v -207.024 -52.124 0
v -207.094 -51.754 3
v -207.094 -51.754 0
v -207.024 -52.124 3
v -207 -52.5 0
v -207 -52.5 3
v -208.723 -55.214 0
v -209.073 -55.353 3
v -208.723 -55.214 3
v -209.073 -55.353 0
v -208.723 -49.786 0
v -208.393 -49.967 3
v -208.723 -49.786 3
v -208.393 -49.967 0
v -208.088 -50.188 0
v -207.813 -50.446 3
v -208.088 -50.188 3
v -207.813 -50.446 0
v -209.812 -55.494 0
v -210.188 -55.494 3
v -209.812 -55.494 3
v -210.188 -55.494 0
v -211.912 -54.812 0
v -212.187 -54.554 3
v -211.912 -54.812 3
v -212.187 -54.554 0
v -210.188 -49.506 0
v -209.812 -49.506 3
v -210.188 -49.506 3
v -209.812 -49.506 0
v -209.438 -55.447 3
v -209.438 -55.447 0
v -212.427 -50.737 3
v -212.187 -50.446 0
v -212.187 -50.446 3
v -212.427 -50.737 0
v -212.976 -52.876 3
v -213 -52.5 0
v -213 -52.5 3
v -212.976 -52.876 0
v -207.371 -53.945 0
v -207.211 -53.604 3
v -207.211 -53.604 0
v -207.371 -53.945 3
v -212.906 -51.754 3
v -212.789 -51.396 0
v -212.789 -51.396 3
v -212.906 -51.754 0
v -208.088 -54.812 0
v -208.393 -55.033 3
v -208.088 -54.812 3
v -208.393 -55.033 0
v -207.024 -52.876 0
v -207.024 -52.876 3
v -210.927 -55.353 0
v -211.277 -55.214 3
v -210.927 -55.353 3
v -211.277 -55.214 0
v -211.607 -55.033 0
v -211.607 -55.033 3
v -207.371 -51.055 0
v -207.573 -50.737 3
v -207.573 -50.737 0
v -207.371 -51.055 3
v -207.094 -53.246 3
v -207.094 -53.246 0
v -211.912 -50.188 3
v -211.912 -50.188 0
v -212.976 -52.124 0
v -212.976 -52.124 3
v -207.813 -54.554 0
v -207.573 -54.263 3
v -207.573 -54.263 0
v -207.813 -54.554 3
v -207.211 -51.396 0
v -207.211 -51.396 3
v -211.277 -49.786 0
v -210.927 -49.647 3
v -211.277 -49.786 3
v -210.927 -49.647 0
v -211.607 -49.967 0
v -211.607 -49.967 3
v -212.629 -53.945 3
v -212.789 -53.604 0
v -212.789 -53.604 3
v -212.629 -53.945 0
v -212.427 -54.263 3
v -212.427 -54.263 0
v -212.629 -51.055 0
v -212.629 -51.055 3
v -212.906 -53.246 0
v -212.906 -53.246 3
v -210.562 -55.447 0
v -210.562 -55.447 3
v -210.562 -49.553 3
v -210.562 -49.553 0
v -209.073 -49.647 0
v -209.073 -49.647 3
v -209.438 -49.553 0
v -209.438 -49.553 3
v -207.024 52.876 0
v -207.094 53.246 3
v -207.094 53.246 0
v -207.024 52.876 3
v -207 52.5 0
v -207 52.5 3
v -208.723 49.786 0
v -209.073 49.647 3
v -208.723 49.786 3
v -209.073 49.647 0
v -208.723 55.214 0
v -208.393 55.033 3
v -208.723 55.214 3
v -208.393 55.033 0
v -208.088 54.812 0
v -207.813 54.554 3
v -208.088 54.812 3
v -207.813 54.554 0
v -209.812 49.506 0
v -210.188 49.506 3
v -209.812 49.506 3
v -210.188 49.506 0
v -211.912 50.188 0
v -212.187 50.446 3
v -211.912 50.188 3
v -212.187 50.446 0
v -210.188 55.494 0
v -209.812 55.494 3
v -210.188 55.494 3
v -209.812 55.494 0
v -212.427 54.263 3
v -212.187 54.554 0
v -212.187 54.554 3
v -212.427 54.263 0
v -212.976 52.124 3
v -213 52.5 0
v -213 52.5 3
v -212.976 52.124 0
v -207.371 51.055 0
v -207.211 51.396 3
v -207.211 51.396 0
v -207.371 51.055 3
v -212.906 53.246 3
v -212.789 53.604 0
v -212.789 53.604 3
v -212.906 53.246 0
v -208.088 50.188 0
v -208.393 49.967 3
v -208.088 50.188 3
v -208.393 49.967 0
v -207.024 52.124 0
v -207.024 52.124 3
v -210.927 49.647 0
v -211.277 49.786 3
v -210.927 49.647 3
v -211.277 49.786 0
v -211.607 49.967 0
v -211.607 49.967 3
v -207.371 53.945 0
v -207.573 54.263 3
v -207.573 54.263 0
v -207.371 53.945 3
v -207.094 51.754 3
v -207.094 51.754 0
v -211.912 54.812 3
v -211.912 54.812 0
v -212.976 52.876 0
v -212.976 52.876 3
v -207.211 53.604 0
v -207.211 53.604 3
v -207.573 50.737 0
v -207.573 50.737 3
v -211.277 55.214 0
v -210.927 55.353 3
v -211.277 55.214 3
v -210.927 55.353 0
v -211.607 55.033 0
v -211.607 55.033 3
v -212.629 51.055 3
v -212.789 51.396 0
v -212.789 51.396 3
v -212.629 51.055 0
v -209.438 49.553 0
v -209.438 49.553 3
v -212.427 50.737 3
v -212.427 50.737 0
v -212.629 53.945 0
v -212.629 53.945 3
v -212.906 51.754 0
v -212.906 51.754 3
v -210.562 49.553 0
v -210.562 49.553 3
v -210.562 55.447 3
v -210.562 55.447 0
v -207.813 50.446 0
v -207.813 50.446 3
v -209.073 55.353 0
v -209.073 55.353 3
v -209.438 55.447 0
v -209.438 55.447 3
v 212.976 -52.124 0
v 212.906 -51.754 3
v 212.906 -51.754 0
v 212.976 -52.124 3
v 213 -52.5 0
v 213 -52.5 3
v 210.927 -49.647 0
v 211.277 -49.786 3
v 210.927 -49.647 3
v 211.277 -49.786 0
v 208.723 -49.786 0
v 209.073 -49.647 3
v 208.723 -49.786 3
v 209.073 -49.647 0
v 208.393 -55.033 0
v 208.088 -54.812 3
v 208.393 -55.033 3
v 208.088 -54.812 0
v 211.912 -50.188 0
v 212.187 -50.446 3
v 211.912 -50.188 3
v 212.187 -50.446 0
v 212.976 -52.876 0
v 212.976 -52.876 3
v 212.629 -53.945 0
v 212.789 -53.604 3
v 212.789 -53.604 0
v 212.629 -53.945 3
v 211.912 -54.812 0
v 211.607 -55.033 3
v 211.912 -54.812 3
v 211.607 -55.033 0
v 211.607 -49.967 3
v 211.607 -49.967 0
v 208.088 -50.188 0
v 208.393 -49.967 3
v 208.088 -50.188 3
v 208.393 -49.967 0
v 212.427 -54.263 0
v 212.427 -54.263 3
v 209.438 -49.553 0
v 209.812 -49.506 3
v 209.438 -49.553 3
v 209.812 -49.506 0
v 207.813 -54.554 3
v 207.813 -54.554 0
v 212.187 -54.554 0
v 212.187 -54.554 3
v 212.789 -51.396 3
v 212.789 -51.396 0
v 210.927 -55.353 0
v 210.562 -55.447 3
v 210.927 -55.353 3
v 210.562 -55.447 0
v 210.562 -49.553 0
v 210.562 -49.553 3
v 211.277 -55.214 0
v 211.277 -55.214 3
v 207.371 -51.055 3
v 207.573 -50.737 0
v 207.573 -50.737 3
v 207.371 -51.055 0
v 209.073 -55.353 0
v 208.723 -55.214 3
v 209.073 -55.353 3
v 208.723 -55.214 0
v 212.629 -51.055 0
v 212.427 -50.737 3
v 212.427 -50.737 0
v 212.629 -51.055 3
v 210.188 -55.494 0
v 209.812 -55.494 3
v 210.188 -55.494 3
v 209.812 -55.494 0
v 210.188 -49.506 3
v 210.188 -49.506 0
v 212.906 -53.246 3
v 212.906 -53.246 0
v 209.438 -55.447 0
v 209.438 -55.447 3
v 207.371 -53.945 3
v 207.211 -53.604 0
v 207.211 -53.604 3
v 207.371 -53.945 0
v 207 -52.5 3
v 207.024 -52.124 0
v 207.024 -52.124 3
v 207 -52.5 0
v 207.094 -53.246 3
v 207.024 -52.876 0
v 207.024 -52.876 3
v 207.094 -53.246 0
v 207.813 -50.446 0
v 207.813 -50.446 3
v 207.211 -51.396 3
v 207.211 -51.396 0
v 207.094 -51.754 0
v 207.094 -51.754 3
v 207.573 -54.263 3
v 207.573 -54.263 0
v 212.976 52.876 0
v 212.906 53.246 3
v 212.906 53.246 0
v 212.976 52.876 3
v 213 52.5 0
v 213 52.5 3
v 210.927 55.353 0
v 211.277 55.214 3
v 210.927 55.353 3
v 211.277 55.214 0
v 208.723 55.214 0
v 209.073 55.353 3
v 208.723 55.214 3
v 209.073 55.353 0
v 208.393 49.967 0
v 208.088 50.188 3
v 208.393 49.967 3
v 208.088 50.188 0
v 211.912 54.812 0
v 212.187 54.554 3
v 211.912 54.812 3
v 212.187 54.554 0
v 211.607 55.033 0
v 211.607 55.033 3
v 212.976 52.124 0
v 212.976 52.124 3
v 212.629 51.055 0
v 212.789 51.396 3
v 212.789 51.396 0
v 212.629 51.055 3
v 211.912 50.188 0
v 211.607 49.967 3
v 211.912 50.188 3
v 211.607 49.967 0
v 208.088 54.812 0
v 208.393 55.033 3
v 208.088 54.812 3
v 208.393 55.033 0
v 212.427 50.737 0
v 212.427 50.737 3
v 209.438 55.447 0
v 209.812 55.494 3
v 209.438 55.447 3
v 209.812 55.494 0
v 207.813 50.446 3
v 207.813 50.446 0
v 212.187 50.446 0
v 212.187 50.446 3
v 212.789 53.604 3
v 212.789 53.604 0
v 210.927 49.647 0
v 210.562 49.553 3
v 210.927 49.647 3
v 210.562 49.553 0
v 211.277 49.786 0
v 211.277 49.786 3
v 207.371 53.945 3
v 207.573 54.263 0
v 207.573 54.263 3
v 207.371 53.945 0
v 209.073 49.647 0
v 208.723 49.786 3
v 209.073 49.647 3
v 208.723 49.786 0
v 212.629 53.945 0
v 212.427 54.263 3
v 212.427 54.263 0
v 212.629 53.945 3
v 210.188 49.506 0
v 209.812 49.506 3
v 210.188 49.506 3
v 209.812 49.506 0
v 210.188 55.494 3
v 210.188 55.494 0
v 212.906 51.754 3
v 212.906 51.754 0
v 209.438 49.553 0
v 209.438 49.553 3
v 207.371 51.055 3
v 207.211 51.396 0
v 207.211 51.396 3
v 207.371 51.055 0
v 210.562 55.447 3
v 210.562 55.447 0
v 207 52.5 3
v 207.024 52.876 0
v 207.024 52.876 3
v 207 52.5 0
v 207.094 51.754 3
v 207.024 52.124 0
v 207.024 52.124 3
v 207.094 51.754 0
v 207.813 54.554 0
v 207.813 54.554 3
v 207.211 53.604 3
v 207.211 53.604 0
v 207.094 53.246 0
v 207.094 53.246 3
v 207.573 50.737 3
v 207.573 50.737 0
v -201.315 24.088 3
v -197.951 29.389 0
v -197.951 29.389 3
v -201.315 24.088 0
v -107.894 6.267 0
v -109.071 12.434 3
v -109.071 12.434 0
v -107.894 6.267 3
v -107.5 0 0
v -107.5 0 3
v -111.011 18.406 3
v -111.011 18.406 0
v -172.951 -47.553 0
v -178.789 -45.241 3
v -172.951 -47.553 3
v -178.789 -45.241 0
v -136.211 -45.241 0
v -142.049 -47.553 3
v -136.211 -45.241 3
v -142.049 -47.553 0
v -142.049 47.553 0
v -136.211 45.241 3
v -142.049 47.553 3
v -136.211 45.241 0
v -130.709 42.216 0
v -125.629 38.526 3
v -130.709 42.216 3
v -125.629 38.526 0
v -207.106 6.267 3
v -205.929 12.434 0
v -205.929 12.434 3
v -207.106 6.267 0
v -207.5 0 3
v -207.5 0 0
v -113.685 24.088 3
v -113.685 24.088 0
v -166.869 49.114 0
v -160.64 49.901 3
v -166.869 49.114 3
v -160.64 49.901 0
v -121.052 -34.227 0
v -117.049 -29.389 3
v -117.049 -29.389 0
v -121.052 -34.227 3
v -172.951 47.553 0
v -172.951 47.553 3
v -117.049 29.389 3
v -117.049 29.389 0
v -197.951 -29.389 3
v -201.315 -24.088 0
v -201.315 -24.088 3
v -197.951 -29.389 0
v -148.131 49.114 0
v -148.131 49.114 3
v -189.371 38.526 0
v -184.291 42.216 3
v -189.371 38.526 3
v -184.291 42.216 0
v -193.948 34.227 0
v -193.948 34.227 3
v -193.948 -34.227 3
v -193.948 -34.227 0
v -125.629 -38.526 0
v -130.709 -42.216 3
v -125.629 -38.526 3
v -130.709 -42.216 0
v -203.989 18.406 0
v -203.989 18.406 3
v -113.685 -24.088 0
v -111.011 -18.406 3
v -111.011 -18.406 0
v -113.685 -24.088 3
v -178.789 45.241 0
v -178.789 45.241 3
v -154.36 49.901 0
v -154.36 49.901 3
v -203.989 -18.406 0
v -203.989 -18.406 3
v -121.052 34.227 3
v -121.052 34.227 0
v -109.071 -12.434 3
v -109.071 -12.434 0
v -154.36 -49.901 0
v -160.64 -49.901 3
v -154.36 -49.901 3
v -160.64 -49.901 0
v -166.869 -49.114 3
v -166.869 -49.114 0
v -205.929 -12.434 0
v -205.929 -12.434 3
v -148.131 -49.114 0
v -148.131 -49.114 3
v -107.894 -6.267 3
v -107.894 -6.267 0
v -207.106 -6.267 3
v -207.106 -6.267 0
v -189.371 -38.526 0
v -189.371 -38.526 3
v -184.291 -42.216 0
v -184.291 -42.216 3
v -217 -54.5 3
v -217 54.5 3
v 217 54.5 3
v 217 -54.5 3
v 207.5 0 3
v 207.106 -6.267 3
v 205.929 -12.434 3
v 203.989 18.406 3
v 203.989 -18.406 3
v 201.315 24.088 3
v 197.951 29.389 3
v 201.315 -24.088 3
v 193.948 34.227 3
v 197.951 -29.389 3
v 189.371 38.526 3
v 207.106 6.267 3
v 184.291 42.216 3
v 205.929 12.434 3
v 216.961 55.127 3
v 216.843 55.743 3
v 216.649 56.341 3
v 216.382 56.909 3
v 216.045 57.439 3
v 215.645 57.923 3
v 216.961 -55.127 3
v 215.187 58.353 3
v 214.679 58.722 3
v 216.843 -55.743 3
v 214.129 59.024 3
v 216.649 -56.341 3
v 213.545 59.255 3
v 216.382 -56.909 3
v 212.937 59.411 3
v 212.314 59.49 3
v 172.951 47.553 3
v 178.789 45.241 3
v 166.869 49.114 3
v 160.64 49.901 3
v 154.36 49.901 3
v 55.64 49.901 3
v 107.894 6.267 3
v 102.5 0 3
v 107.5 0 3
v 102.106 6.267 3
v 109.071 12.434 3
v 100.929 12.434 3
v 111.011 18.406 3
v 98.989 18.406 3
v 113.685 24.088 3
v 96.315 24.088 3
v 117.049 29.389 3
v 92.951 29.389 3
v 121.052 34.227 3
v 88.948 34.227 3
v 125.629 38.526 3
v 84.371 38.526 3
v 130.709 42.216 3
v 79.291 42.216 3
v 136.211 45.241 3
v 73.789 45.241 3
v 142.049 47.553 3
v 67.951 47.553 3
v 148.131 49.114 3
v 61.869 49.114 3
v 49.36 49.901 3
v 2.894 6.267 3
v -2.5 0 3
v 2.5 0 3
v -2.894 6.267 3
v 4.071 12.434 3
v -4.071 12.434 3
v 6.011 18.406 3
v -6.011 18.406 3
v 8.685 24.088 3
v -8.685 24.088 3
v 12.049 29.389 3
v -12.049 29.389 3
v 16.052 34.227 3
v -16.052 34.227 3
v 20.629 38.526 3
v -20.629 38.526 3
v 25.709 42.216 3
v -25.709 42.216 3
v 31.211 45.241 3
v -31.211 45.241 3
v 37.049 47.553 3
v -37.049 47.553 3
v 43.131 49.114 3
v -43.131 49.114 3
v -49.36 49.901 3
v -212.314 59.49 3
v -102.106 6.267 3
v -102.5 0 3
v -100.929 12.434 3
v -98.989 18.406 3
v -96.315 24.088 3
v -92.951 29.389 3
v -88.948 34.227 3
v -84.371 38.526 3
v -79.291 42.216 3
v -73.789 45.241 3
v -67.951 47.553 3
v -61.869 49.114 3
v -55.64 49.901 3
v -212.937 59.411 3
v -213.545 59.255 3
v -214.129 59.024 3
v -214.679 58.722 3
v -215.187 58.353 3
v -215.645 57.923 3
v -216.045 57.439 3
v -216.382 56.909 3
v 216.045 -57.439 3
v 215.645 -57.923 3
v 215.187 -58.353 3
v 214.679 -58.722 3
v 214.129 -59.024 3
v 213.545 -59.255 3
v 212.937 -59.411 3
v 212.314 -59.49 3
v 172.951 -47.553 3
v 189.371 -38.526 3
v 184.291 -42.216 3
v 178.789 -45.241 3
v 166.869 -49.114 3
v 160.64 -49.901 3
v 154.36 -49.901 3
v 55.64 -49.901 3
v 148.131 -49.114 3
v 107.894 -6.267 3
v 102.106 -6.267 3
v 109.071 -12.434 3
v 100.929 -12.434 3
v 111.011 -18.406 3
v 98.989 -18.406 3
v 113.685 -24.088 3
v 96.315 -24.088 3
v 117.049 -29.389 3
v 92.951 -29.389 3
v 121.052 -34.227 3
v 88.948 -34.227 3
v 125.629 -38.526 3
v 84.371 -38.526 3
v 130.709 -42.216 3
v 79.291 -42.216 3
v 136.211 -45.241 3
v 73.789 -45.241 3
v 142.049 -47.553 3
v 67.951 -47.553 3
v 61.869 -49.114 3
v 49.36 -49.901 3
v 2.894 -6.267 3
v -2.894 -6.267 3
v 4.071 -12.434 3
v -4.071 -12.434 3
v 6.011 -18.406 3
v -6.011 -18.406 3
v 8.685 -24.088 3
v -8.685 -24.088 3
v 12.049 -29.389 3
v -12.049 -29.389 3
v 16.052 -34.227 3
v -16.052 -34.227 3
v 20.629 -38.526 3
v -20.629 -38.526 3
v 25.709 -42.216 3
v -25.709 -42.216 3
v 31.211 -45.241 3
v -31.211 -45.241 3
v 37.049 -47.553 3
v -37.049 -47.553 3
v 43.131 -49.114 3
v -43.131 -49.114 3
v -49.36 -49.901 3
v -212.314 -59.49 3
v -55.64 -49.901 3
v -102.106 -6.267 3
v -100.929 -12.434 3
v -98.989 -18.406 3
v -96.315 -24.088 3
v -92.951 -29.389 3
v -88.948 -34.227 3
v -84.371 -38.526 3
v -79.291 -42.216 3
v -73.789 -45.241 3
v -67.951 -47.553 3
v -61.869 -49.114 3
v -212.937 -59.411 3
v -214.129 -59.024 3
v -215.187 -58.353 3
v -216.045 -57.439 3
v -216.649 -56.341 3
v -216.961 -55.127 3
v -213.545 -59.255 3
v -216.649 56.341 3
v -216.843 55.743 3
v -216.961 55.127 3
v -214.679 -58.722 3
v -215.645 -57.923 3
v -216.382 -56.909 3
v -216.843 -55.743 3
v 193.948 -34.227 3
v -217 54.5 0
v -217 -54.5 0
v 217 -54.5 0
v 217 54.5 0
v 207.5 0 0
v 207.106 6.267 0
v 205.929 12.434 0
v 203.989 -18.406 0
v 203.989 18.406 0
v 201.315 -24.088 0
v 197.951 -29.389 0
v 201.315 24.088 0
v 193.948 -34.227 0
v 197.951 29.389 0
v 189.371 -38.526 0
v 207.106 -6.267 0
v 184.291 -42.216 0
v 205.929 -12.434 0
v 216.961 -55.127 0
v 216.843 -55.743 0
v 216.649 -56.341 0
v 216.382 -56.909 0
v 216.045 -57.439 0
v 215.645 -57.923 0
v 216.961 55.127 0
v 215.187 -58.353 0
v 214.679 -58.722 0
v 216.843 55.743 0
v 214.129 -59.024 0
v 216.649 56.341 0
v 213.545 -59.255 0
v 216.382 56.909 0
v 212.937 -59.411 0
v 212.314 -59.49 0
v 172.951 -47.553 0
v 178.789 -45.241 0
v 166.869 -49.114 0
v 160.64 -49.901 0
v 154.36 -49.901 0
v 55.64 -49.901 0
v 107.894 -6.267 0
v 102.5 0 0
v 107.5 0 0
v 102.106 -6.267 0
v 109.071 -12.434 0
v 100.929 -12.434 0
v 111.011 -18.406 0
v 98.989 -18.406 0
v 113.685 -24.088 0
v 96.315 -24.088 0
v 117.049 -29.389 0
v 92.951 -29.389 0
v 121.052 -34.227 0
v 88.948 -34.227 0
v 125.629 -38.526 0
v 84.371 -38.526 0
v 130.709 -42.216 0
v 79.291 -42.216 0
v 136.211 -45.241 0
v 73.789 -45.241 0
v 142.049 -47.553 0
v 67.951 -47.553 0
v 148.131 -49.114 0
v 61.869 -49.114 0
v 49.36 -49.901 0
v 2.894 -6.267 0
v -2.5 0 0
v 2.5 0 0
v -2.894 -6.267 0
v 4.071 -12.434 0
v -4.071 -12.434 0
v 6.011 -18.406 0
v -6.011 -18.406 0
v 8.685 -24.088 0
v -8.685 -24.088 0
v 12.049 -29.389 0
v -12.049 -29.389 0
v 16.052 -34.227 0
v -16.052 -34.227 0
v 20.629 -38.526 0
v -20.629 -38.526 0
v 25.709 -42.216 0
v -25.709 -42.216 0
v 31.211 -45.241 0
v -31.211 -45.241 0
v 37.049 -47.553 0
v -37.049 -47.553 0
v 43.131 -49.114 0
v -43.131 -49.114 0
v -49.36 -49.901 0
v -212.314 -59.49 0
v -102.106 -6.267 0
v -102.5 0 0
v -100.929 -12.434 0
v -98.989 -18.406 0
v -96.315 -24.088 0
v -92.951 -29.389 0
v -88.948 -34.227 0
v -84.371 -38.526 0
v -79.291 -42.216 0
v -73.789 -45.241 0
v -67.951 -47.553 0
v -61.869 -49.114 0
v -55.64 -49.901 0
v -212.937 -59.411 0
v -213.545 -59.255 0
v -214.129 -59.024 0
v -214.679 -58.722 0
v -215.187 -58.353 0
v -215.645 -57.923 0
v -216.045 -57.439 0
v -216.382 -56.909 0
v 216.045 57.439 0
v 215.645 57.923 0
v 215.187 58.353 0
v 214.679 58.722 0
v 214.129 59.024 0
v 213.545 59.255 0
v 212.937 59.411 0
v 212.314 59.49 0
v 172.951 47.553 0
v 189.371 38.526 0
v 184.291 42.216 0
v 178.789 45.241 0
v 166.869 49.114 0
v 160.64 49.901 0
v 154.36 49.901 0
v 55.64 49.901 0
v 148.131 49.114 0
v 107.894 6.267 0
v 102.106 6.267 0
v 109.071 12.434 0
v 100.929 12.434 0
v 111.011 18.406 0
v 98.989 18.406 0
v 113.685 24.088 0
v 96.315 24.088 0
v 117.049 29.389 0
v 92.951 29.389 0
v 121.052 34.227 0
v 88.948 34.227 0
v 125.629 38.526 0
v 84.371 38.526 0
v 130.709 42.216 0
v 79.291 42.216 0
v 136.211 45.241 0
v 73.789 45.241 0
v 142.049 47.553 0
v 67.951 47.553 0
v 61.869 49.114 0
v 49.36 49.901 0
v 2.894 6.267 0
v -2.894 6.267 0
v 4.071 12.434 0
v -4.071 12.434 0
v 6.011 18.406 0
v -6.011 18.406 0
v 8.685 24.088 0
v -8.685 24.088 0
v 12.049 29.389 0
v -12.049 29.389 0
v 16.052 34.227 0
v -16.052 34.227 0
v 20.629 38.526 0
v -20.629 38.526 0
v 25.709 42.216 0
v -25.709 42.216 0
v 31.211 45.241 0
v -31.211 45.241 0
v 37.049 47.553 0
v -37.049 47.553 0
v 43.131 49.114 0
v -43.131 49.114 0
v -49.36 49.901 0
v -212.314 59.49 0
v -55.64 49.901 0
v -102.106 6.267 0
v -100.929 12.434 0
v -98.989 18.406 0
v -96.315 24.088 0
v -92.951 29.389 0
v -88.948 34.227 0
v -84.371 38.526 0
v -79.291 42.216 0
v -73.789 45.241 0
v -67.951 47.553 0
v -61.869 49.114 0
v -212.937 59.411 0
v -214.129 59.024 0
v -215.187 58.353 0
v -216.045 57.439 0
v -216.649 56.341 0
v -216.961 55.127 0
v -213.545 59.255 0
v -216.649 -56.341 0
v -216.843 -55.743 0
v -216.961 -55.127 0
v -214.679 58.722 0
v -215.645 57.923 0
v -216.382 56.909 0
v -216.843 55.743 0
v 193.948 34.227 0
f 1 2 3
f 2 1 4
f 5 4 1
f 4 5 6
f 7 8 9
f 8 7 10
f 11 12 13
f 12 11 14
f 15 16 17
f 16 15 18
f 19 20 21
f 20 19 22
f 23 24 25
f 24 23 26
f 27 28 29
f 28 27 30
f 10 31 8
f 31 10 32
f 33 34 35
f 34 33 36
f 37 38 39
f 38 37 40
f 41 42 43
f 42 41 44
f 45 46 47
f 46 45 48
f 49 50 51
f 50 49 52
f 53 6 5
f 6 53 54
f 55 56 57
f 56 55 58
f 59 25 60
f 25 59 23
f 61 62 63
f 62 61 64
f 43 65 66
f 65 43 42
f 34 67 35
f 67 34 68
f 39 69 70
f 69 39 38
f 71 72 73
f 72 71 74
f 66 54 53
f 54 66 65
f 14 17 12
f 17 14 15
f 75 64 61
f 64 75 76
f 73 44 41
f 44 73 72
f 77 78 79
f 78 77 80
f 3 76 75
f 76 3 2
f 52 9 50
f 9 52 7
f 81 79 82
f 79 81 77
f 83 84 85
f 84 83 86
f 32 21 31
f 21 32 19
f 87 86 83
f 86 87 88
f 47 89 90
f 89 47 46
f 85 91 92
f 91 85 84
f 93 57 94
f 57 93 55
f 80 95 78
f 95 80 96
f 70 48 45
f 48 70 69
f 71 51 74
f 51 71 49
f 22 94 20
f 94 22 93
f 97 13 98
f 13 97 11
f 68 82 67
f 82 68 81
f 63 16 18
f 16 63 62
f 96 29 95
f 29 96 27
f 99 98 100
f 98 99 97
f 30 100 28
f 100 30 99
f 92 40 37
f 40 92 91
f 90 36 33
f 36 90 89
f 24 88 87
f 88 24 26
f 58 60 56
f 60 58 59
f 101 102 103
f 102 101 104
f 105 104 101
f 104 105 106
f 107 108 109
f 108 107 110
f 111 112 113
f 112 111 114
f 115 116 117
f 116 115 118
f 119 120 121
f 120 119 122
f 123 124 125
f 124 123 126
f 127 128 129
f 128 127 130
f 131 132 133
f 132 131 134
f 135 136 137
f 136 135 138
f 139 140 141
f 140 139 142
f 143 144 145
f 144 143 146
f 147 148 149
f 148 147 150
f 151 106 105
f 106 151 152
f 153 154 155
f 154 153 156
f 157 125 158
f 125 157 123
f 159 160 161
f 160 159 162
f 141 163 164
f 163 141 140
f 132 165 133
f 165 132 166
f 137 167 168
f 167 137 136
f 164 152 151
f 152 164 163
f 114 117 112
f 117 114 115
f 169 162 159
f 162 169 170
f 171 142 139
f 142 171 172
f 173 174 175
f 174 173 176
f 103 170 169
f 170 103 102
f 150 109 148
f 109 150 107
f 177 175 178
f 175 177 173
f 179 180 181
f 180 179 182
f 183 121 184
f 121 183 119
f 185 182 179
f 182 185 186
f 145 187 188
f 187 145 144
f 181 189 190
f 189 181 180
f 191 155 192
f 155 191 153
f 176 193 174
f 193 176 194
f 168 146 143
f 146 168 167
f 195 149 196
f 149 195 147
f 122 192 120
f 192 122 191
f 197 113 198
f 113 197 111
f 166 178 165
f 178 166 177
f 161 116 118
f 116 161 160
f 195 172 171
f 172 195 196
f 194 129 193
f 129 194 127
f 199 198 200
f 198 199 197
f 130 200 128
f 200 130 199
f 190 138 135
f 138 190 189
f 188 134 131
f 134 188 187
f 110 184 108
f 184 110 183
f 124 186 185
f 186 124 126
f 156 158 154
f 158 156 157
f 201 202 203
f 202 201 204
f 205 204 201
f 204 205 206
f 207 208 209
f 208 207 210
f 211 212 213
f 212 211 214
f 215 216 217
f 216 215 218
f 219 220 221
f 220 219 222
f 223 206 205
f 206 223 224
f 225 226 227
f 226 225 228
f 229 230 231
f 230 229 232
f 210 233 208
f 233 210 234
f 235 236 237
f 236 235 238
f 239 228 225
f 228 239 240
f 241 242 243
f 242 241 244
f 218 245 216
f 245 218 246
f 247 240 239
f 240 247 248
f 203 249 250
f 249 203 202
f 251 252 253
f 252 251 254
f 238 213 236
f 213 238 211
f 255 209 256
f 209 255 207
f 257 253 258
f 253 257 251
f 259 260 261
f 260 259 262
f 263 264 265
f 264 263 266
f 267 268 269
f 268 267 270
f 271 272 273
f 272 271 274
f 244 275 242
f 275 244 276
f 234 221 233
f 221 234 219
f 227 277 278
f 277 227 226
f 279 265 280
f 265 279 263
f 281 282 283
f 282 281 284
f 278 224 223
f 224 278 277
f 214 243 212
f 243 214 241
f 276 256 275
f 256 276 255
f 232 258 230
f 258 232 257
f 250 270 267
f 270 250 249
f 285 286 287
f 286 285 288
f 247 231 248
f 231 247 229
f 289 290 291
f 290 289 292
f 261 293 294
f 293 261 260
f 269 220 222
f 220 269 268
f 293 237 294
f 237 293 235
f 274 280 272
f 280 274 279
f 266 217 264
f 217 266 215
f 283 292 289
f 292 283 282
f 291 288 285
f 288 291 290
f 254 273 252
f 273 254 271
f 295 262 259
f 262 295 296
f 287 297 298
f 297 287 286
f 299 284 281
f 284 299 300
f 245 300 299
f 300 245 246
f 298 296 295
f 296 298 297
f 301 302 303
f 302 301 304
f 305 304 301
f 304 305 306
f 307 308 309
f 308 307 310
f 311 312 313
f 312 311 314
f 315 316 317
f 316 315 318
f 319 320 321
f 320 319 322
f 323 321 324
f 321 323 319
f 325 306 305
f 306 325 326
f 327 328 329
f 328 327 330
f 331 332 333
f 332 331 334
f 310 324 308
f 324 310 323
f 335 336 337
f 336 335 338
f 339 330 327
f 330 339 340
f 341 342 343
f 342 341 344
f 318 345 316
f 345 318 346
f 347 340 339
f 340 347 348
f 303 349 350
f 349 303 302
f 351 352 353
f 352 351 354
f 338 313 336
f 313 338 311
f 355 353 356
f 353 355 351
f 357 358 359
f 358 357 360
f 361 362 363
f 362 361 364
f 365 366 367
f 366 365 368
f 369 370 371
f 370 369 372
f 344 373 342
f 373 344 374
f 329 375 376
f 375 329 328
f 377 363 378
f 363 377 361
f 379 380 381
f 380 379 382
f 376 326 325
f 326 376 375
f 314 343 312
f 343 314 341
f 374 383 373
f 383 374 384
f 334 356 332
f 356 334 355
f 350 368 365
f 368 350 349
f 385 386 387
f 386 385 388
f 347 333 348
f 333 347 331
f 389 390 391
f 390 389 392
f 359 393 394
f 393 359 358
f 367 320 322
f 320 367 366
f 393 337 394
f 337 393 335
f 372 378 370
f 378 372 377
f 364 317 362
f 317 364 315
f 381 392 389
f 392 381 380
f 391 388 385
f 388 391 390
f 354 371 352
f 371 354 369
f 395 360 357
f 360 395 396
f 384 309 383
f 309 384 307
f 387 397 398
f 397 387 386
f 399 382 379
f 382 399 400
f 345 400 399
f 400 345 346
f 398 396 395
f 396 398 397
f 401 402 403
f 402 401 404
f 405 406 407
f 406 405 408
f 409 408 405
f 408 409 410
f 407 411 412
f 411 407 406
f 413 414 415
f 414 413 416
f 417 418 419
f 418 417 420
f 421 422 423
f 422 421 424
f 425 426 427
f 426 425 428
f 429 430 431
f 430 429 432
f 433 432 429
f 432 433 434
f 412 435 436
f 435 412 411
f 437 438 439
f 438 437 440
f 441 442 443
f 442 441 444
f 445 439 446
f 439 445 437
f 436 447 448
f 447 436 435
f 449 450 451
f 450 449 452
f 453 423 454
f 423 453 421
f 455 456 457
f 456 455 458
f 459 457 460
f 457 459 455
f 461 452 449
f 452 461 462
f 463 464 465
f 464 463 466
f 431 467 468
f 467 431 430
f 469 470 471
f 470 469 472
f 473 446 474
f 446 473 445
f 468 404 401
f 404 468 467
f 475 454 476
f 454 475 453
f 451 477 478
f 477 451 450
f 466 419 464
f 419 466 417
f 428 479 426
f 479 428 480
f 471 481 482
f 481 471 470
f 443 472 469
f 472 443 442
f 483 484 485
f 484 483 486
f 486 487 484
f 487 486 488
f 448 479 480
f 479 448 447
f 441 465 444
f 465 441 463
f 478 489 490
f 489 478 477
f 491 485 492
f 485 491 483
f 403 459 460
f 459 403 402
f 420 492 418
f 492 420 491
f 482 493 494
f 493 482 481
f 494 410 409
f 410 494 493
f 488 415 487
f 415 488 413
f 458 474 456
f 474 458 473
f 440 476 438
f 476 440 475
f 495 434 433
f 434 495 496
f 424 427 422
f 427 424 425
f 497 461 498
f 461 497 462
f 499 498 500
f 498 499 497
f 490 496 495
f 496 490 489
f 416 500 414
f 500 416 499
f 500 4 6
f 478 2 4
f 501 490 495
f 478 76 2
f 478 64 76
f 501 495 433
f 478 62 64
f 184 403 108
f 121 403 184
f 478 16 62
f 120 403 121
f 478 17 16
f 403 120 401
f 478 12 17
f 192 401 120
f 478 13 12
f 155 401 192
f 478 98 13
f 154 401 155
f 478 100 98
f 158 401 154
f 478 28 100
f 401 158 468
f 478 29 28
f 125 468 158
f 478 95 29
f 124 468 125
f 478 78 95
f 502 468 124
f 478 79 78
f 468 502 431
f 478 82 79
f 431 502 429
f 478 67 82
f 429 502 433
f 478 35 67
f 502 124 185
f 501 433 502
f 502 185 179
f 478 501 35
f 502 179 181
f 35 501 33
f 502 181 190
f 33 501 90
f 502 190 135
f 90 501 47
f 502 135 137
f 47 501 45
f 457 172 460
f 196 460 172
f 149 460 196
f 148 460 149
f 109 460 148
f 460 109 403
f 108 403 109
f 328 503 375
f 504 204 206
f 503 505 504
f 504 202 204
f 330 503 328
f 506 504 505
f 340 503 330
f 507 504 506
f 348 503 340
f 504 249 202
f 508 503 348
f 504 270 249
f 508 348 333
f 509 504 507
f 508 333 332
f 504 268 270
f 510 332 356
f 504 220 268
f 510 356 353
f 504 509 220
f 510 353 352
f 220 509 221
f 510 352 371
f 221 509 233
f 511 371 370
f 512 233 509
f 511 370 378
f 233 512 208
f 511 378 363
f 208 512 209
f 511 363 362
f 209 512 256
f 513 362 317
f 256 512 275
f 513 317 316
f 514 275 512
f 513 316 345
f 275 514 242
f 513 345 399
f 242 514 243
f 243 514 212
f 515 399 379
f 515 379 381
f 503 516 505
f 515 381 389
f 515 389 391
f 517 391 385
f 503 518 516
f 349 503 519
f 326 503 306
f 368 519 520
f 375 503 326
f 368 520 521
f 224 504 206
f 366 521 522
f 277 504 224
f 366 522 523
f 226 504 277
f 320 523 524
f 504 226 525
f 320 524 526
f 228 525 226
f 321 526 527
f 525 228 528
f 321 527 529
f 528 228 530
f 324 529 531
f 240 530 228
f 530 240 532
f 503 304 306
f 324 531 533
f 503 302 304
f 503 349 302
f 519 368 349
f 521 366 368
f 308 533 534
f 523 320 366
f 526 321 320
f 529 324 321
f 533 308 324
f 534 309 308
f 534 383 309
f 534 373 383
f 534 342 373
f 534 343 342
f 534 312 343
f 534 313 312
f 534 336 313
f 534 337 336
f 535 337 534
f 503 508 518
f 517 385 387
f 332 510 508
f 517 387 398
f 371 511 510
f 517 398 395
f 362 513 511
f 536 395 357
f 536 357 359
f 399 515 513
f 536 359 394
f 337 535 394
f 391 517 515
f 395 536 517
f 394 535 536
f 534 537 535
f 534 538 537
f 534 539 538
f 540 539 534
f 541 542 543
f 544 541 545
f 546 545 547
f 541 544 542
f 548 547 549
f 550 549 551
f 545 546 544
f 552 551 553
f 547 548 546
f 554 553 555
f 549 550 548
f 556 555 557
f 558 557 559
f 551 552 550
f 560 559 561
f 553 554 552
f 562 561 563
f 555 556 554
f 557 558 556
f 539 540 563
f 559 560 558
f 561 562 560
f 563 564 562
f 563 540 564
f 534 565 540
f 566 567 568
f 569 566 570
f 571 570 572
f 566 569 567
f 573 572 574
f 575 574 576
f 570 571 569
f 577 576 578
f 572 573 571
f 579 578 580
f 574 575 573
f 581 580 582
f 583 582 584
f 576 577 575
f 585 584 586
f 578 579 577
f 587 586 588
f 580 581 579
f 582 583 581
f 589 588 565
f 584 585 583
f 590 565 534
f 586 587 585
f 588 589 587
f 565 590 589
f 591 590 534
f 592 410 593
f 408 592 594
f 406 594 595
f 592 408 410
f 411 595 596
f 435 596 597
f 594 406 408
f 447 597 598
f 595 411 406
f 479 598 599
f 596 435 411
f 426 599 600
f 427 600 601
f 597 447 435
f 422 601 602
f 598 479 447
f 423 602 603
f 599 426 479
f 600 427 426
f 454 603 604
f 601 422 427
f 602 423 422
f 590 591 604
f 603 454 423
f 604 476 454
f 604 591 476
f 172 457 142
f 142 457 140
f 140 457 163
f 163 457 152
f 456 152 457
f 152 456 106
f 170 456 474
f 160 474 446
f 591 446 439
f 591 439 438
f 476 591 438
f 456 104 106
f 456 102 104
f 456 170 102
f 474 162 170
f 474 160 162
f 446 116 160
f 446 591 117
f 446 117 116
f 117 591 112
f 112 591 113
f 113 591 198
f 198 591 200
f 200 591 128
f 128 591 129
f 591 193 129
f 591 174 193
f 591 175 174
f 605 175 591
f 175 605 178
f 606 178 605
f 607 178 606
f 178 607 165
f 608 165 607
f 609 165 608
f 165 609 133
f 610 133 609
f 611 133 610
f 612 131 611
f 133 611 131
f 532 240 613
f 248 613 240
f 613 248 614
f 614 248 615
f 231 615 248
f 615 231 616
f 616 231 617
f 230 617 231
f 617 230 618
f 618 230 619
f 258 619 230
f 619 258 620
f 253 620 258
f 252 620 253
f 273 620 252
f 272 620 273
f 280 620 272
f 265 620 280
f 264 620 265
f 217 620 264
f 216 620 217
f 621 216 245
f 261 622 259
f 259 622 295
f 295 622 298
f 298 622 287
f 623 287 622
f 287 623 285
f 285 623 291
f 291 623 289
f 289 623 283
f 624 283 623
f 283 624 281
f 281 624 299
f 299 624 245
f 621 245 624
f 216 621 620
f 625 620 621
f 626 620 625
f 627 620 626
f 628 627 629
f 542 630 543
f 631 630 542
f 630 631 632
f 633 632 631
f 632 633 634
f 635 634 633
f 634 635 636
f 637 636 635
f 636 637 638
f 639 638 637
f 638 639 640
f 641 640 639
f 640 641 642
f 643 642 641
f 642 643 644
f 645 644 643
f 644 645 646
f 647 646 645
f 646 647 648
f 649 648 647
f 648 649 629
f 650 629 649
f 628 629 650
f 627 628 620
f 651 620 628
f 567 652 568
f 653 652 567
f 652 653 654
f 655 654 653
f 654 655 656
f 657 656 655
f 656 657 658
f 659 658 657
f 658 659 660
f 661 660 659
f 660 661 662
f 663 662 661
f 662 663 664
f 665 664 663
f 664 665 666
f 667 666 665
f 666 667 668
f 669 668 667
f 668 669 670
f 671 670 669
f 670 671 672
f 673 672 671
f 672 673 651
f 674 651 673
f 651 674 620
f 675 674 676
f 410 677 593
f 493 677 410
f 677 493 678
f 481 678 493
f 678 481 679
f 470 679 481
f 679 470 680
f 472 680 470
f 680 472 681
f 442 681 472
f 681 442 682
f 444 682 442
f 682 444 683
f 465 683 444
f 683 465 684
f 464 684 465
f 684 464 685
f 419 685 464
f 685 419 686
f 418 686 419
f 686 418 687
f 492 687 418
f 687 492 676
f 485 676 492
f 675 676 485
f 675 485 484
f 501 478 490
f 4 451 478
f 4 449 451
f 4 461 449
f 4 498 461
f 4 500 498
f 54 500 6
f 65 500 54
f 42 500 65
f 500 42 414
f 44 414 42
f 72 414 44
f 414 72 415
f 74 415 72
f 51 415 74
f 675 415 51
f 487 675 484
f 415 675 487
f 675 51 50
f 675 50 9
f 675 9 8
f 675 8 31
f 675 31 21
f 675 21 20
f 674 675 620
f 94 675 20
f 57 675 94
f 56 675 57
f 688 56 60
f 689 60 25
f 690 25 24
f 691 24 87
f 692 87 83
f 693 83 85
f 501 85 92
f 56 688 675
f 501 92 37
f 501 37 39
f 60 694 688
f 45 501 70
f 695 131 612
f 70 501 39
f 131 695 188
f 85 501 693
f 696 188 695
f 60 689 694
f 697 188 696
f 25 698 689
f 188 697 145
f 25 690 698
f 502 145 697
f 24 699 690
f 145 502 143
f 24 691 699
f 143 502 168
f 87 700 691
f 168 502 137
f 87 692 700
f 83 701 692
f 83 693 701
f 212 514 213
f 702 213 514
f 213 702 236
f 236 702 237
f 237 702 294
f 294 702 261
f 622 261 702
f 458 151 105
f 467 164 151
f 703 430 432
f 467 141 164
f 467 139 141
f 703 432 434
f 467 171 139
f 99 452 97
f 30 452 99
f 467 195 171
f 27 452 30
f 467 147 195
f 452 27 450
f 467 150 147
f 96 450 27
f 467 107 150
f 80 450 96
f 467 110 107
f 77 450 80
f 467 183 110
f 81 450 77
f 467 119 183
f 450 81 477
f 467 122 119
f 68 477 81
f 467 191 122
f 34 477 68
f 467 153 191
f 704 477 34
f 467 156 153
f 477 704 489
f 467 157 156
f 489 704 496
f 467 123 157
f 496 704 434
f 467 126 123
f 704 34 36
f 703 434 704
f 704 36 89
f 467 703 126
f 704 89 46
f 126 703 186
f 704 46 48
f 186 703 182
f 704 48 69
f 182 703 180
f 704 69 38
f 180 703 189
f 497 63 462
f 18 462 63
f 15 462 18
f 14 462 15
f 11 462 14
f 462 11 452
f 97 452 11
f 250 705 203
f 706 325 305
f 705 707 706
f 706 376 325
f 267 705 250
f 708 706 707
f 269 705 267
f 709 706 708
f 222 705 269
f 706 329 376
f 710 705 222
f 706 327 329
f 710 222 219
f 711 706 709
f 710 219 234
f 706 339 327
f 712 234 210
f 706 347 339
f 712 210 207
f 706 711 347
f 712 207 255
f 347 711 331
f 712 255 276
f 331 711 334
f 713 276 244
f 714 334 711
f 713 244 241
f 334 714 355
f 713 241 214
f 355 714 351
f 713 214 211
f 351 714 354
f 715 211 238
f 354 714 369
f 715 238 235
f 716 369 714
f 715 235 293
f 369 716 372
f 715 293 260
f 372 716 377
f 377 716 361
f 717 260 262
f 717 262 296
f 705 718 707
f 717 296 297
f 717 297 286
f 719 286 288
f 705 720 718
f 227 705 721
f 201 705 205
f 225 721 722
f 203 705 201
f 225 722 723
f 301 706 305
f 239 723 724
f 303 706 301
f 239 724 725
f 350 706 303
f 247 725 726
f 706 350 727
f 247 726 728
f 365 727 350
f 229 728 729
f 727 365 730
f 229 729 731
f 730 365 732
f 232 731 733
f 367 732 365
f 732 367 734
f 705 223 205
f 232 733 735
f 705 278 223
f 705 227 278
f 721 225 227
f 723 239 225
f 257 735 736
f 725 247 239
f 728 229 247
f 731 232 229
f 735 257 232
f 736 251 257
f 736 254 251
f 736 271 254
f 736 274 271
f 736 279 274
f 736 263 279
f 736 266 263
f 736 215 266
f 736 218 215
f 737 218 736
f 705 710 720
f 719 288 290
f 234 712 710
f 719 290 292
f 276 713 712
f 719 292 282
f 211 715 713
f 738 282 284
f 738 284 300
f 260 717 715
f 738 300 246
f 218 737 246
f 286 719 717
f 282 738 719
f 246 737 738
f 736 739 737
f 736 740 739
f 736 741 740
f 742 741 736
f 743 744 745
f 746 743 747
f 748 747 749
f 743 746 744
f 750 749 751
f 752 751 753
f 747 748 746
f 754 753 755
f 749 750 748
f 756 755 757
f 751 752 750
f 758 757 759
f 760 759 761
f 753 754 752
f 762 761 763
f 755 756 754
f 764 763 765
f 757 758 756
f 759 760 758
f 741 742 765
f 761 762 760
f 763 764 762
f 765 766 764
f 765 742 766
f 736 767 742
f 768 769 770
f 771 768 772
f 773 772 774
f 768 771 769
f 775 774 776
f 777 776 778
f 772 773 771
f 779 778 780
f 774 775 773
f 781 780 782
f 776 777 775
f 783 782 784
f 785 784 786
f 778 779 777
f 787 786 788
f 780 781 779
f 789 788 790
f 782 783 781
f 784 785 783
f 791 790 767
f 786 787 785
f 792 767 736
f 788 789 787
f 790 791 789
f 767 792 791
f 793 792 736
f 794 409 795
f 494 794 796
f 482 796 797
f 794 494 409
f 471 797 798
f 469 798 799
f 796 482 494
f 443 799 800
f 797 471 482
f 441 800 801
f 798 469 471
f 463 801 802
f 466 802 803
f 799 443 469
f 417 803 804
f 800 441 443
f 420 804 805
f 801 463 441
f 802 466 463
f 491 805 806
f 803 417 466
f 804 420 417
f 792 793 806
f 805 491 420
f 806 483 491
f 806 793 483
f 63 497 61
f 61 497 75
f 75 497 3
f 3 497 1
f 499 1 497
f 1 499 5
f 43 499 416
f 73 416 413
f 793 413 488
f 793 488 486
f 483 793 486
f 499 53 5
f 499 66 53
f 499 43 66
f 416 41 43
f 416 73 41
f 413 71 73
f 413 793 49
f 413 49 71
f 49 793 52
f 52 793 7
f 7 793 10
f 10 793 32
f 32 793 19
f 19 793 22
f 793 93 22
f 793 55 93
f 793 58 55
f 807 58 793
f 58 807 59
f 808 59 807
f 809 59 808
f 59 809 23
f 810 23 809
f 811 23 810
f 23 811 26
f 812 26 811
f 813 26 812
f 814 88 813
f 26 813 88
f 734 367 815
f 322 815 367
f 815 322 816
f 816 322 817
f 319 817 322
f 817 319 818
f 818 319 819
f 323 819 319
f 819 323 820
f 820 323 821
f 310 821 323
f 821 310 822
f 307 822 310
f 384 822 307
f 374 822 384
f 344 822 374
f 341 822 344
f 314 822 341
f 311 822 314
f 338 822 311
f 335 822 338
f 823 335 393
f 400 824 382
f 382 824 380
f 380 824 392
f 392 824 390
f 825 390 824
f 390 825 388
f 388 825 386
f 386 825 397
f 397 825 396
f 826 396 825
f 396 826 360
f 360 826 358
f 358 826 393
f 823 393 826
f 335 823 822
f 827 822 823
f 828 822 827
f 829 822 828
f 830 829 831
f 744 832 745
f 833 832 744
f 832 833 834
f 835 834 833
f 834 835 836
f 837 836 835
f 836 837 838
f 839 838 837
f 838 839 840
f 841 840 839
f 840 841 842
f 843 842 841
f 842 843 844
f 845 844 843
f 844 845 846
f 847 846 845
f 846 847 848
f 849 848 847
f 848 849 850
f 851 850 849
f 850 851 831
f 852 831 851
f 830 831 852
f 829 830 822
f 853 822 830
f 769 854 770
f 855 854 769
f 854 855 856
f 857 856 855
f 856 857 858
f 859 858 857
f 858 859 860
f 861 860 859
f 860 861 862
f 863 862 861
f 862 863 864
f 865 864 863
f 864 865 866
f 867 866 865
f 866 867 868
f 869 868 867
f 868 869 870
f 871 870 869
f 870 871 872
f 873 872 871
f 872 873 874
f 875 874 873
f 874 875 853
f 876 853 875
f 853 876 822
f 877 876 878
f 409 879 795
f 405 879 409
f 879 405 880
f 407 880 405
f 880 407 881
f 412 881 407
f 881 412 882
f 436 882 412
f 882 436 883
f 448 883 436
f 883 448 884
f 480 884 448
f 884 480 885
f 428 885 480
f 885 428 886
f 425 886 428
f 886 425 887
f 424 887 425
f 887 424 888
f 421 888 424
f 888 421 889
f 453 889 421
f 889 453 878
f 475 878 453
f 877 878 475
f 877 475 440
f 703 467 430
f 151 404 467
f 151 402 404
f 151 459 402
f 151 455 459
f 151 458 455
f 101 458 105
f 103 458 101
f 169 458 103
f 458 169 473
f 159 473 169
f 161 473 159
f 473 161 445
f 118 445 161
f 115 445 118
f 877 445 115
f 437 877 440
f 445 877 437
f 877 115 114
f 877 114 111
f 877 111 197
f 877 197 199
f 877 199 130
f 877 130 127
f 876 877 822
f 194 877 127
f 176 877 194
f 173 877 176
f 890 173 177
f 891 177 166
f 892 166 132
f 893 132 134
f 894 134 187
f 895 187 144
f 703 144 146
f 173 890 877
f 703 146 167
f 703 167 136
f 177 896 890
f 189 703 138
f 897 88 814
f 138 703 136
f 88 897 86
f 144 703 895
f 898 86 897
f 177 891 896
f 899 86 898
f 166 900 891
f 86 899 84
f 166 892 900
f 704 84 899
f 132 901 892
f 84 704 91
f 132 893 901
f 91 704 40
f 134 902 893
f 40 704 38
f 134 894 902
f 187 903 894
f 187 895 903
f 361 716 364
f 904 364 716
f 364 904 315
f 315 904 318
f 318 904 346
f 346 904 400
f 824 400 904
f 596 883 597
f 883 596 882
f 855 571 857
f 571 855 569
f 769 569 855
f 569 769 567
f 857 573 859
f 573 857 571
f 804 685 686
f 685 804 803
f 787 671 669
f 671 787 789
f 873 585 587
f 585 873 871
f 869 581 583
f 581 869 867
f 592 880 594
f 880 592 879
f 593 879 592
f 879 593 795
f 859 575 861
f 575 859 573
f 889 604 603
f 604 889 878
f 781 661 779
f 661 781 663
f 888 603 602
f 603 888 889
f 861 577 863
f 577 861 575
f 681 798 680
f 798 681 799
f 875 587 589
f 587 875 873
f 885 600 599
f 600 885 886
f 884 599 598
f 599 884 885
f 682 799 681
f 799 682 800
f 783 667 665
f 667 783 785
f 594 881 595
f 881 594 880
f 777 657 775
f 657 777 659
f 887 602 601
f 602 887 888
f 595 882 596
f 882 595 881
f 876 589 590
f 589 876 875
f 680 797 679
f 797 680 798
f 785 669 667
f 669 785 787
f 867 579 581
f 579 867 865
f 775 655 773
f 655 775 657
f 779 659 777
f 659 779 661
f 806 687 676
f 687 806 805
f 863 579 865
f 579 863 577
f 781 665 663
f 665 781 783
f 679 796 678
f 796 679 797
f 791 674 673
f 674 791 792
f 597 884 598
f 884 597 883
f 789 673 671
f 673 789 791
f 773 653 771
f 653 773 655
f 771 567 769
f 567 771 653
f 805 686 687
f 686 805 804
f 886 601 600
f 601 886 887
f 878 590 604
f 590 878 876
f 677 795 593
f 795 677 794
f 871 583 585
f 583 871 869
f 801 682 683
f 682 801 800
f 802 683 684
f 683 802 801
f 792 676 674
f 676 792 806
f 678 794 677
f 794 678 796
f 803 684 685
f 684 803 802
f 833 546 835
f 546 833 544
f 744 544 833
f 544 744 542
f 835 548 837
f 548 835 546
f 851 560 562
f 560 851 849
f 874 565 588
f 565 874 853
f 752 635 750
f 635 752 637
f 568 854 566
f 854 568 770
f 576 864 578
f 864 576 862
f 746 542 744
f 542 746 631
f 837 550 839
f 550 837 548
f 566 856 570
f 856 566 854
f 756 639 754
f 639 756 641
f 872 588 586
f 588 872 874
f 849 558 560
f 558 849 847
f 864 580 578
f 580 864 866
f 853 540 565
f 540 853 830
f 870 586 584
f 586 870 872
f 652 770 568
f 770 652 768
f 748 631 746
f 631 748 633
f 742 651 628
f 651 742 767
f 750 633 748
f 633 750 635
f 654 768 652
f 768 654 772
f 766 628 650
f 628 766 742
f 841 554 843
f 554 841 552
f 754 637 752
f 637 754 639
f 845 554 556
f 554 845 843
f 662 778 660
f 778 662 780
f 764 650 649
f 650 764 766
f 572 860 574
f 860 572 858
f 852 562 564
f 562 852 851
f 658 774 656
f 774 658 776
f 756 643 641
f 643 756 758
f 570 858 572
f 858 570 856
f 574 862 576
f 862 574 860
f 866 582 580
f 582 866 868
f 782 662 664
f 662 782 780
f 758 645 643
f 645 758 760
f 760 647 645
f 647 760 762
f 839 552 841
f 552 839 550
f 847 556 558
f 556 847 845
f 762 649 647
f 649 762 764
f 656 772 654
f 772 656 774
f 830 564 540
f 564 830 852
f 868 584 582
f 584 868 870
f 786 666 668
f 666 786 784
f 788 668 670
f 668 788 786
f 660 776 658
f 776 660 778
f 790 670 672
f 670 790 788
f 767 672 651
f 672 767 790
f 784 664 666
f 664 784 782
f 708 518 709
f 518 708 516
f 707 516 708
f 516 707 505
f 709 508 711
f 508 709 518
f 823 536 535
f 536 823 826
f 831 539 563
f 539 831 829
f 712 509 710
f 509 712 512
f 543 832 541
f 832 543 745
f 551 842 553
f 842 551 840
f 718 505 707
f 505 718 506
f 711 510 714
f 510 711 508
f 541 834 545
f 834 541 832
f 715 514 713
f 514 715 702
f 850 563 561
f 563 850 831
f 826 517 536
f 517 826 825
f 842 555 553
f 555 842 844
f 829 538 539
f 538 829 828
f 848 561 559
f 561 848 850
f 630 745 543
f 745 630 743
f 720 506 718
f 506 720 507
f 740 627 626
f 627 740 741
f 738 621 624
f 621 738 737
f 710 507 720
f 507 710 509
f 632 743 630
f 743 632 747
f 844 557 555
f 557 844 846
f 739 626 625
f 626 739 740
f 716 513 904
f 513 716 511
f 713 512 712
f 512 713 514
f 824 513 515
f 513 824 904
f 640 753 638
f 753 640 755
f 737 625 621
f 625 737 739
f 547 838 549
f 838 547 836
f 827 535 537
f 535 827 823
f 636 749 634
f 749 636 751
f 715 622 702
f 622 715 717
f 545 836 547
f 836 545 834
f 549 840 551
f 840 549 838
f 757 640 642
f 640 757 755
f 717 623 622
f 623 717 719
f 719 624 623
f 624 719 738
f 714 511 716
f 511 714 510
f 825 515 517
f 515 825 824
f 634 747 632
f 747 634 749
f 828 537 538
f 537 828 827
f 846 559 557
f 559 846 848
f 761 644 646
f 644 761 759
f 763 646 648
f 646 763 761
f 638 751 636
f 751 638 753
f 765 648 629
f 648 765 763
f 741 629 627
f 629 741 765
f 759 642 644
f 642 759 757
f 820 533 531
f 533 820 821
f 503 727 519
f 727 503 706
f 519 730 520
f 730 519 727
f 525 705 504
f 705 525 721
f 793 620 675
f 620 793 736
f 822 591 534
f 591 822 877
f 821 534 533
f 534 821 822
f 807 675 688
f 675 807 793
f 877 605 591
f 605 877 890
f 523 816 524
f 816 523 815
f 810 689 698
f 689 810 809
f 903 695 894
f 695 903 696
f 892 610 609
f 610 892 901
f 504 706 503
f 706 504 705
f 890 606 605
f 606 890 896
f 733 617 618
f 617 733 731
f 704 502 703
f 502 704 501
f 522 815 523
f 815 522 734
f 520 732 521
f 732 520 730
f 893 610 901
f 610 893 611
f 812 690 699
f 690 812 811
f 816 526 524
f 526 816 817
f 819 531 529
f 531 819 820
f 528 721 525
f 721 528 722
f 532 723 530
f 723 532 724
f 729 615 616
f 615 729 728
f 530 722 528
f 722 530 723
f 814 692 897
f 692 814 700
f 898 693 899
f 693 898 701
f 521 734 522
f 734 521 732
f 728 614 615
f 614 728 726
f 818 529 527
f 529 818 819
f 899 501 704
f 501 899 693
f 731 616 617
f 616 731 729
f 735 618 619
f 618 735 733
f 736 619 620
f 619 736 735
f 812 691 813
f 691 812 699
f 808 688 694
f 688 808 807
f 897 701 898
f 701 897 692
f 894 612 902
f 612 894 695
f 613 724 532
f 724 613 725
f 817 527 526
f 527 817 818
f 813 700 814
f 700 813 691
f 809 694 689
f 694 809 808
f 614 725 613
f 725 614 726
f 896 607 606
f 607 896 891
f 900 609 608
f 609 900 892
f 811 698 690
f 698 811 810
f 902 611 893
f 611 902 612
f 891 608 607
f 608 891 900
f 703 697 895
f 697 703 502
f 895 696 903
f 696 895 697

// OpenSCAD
$fn = 50;


difference() {
	union() {
		hull() {
			translate(v = [-212.0000000000, 54.5000000000, 0]) {
				cylinder(h = 3, r = 5);
			}
			translate(v = [212.0000000000, 54.5000000000, 0]) {
				cylinder(h = 3, r = 5);
			}
			translate(v = [-212.0000000000, -54.5000000000, 0]) {
				cylinder(h = 3, r = 5);
			}
			translate(v = [212.0000000000, -54.5000000000, 0]) {
				cylinder(h = 3, r = 5);
			}
		}
	}
	union() {
		#translate(v = [-210.0000000000, -52.5000000000, -100.0000000000]) {
			cylinder(h = 200, r = 3.0000000000);
		}
		#translate(v = [-210.0000000000, 52.5000000000, -100.0000000000]) {
			cylinder(h = 200, r = 3.0000000000);
		}
		#translate(v = [210.0000000000, -52.5000000000, -100.0000000000]) {
			cylinder(h = 200, r = 3.0000000000);
		}
		#translate(v = [210.0000000000, 52.5000000000, -100.0000000000]) {
			cylinder(h = 200, r = 3.0000000000);
		}
		#translate(v = [-157.5000000000, 0, 0]) {
			cylinder(h = 3, r = 50.0000000000);
		}
		#translate(v = [-52.5000000000, 0, 0]) {
			cylinder(h = 3, r = 50.0000000000);
		}
		#translate(v = [52.5000000000, 0, 0]) {
			cylinder(h = 3, r = 50.0000000000);
		}
		#translate(v = [157.5000000000, 0, 0]) {
			cylinder(h = 3, r = 50.0000000000);
		}
	}
}
